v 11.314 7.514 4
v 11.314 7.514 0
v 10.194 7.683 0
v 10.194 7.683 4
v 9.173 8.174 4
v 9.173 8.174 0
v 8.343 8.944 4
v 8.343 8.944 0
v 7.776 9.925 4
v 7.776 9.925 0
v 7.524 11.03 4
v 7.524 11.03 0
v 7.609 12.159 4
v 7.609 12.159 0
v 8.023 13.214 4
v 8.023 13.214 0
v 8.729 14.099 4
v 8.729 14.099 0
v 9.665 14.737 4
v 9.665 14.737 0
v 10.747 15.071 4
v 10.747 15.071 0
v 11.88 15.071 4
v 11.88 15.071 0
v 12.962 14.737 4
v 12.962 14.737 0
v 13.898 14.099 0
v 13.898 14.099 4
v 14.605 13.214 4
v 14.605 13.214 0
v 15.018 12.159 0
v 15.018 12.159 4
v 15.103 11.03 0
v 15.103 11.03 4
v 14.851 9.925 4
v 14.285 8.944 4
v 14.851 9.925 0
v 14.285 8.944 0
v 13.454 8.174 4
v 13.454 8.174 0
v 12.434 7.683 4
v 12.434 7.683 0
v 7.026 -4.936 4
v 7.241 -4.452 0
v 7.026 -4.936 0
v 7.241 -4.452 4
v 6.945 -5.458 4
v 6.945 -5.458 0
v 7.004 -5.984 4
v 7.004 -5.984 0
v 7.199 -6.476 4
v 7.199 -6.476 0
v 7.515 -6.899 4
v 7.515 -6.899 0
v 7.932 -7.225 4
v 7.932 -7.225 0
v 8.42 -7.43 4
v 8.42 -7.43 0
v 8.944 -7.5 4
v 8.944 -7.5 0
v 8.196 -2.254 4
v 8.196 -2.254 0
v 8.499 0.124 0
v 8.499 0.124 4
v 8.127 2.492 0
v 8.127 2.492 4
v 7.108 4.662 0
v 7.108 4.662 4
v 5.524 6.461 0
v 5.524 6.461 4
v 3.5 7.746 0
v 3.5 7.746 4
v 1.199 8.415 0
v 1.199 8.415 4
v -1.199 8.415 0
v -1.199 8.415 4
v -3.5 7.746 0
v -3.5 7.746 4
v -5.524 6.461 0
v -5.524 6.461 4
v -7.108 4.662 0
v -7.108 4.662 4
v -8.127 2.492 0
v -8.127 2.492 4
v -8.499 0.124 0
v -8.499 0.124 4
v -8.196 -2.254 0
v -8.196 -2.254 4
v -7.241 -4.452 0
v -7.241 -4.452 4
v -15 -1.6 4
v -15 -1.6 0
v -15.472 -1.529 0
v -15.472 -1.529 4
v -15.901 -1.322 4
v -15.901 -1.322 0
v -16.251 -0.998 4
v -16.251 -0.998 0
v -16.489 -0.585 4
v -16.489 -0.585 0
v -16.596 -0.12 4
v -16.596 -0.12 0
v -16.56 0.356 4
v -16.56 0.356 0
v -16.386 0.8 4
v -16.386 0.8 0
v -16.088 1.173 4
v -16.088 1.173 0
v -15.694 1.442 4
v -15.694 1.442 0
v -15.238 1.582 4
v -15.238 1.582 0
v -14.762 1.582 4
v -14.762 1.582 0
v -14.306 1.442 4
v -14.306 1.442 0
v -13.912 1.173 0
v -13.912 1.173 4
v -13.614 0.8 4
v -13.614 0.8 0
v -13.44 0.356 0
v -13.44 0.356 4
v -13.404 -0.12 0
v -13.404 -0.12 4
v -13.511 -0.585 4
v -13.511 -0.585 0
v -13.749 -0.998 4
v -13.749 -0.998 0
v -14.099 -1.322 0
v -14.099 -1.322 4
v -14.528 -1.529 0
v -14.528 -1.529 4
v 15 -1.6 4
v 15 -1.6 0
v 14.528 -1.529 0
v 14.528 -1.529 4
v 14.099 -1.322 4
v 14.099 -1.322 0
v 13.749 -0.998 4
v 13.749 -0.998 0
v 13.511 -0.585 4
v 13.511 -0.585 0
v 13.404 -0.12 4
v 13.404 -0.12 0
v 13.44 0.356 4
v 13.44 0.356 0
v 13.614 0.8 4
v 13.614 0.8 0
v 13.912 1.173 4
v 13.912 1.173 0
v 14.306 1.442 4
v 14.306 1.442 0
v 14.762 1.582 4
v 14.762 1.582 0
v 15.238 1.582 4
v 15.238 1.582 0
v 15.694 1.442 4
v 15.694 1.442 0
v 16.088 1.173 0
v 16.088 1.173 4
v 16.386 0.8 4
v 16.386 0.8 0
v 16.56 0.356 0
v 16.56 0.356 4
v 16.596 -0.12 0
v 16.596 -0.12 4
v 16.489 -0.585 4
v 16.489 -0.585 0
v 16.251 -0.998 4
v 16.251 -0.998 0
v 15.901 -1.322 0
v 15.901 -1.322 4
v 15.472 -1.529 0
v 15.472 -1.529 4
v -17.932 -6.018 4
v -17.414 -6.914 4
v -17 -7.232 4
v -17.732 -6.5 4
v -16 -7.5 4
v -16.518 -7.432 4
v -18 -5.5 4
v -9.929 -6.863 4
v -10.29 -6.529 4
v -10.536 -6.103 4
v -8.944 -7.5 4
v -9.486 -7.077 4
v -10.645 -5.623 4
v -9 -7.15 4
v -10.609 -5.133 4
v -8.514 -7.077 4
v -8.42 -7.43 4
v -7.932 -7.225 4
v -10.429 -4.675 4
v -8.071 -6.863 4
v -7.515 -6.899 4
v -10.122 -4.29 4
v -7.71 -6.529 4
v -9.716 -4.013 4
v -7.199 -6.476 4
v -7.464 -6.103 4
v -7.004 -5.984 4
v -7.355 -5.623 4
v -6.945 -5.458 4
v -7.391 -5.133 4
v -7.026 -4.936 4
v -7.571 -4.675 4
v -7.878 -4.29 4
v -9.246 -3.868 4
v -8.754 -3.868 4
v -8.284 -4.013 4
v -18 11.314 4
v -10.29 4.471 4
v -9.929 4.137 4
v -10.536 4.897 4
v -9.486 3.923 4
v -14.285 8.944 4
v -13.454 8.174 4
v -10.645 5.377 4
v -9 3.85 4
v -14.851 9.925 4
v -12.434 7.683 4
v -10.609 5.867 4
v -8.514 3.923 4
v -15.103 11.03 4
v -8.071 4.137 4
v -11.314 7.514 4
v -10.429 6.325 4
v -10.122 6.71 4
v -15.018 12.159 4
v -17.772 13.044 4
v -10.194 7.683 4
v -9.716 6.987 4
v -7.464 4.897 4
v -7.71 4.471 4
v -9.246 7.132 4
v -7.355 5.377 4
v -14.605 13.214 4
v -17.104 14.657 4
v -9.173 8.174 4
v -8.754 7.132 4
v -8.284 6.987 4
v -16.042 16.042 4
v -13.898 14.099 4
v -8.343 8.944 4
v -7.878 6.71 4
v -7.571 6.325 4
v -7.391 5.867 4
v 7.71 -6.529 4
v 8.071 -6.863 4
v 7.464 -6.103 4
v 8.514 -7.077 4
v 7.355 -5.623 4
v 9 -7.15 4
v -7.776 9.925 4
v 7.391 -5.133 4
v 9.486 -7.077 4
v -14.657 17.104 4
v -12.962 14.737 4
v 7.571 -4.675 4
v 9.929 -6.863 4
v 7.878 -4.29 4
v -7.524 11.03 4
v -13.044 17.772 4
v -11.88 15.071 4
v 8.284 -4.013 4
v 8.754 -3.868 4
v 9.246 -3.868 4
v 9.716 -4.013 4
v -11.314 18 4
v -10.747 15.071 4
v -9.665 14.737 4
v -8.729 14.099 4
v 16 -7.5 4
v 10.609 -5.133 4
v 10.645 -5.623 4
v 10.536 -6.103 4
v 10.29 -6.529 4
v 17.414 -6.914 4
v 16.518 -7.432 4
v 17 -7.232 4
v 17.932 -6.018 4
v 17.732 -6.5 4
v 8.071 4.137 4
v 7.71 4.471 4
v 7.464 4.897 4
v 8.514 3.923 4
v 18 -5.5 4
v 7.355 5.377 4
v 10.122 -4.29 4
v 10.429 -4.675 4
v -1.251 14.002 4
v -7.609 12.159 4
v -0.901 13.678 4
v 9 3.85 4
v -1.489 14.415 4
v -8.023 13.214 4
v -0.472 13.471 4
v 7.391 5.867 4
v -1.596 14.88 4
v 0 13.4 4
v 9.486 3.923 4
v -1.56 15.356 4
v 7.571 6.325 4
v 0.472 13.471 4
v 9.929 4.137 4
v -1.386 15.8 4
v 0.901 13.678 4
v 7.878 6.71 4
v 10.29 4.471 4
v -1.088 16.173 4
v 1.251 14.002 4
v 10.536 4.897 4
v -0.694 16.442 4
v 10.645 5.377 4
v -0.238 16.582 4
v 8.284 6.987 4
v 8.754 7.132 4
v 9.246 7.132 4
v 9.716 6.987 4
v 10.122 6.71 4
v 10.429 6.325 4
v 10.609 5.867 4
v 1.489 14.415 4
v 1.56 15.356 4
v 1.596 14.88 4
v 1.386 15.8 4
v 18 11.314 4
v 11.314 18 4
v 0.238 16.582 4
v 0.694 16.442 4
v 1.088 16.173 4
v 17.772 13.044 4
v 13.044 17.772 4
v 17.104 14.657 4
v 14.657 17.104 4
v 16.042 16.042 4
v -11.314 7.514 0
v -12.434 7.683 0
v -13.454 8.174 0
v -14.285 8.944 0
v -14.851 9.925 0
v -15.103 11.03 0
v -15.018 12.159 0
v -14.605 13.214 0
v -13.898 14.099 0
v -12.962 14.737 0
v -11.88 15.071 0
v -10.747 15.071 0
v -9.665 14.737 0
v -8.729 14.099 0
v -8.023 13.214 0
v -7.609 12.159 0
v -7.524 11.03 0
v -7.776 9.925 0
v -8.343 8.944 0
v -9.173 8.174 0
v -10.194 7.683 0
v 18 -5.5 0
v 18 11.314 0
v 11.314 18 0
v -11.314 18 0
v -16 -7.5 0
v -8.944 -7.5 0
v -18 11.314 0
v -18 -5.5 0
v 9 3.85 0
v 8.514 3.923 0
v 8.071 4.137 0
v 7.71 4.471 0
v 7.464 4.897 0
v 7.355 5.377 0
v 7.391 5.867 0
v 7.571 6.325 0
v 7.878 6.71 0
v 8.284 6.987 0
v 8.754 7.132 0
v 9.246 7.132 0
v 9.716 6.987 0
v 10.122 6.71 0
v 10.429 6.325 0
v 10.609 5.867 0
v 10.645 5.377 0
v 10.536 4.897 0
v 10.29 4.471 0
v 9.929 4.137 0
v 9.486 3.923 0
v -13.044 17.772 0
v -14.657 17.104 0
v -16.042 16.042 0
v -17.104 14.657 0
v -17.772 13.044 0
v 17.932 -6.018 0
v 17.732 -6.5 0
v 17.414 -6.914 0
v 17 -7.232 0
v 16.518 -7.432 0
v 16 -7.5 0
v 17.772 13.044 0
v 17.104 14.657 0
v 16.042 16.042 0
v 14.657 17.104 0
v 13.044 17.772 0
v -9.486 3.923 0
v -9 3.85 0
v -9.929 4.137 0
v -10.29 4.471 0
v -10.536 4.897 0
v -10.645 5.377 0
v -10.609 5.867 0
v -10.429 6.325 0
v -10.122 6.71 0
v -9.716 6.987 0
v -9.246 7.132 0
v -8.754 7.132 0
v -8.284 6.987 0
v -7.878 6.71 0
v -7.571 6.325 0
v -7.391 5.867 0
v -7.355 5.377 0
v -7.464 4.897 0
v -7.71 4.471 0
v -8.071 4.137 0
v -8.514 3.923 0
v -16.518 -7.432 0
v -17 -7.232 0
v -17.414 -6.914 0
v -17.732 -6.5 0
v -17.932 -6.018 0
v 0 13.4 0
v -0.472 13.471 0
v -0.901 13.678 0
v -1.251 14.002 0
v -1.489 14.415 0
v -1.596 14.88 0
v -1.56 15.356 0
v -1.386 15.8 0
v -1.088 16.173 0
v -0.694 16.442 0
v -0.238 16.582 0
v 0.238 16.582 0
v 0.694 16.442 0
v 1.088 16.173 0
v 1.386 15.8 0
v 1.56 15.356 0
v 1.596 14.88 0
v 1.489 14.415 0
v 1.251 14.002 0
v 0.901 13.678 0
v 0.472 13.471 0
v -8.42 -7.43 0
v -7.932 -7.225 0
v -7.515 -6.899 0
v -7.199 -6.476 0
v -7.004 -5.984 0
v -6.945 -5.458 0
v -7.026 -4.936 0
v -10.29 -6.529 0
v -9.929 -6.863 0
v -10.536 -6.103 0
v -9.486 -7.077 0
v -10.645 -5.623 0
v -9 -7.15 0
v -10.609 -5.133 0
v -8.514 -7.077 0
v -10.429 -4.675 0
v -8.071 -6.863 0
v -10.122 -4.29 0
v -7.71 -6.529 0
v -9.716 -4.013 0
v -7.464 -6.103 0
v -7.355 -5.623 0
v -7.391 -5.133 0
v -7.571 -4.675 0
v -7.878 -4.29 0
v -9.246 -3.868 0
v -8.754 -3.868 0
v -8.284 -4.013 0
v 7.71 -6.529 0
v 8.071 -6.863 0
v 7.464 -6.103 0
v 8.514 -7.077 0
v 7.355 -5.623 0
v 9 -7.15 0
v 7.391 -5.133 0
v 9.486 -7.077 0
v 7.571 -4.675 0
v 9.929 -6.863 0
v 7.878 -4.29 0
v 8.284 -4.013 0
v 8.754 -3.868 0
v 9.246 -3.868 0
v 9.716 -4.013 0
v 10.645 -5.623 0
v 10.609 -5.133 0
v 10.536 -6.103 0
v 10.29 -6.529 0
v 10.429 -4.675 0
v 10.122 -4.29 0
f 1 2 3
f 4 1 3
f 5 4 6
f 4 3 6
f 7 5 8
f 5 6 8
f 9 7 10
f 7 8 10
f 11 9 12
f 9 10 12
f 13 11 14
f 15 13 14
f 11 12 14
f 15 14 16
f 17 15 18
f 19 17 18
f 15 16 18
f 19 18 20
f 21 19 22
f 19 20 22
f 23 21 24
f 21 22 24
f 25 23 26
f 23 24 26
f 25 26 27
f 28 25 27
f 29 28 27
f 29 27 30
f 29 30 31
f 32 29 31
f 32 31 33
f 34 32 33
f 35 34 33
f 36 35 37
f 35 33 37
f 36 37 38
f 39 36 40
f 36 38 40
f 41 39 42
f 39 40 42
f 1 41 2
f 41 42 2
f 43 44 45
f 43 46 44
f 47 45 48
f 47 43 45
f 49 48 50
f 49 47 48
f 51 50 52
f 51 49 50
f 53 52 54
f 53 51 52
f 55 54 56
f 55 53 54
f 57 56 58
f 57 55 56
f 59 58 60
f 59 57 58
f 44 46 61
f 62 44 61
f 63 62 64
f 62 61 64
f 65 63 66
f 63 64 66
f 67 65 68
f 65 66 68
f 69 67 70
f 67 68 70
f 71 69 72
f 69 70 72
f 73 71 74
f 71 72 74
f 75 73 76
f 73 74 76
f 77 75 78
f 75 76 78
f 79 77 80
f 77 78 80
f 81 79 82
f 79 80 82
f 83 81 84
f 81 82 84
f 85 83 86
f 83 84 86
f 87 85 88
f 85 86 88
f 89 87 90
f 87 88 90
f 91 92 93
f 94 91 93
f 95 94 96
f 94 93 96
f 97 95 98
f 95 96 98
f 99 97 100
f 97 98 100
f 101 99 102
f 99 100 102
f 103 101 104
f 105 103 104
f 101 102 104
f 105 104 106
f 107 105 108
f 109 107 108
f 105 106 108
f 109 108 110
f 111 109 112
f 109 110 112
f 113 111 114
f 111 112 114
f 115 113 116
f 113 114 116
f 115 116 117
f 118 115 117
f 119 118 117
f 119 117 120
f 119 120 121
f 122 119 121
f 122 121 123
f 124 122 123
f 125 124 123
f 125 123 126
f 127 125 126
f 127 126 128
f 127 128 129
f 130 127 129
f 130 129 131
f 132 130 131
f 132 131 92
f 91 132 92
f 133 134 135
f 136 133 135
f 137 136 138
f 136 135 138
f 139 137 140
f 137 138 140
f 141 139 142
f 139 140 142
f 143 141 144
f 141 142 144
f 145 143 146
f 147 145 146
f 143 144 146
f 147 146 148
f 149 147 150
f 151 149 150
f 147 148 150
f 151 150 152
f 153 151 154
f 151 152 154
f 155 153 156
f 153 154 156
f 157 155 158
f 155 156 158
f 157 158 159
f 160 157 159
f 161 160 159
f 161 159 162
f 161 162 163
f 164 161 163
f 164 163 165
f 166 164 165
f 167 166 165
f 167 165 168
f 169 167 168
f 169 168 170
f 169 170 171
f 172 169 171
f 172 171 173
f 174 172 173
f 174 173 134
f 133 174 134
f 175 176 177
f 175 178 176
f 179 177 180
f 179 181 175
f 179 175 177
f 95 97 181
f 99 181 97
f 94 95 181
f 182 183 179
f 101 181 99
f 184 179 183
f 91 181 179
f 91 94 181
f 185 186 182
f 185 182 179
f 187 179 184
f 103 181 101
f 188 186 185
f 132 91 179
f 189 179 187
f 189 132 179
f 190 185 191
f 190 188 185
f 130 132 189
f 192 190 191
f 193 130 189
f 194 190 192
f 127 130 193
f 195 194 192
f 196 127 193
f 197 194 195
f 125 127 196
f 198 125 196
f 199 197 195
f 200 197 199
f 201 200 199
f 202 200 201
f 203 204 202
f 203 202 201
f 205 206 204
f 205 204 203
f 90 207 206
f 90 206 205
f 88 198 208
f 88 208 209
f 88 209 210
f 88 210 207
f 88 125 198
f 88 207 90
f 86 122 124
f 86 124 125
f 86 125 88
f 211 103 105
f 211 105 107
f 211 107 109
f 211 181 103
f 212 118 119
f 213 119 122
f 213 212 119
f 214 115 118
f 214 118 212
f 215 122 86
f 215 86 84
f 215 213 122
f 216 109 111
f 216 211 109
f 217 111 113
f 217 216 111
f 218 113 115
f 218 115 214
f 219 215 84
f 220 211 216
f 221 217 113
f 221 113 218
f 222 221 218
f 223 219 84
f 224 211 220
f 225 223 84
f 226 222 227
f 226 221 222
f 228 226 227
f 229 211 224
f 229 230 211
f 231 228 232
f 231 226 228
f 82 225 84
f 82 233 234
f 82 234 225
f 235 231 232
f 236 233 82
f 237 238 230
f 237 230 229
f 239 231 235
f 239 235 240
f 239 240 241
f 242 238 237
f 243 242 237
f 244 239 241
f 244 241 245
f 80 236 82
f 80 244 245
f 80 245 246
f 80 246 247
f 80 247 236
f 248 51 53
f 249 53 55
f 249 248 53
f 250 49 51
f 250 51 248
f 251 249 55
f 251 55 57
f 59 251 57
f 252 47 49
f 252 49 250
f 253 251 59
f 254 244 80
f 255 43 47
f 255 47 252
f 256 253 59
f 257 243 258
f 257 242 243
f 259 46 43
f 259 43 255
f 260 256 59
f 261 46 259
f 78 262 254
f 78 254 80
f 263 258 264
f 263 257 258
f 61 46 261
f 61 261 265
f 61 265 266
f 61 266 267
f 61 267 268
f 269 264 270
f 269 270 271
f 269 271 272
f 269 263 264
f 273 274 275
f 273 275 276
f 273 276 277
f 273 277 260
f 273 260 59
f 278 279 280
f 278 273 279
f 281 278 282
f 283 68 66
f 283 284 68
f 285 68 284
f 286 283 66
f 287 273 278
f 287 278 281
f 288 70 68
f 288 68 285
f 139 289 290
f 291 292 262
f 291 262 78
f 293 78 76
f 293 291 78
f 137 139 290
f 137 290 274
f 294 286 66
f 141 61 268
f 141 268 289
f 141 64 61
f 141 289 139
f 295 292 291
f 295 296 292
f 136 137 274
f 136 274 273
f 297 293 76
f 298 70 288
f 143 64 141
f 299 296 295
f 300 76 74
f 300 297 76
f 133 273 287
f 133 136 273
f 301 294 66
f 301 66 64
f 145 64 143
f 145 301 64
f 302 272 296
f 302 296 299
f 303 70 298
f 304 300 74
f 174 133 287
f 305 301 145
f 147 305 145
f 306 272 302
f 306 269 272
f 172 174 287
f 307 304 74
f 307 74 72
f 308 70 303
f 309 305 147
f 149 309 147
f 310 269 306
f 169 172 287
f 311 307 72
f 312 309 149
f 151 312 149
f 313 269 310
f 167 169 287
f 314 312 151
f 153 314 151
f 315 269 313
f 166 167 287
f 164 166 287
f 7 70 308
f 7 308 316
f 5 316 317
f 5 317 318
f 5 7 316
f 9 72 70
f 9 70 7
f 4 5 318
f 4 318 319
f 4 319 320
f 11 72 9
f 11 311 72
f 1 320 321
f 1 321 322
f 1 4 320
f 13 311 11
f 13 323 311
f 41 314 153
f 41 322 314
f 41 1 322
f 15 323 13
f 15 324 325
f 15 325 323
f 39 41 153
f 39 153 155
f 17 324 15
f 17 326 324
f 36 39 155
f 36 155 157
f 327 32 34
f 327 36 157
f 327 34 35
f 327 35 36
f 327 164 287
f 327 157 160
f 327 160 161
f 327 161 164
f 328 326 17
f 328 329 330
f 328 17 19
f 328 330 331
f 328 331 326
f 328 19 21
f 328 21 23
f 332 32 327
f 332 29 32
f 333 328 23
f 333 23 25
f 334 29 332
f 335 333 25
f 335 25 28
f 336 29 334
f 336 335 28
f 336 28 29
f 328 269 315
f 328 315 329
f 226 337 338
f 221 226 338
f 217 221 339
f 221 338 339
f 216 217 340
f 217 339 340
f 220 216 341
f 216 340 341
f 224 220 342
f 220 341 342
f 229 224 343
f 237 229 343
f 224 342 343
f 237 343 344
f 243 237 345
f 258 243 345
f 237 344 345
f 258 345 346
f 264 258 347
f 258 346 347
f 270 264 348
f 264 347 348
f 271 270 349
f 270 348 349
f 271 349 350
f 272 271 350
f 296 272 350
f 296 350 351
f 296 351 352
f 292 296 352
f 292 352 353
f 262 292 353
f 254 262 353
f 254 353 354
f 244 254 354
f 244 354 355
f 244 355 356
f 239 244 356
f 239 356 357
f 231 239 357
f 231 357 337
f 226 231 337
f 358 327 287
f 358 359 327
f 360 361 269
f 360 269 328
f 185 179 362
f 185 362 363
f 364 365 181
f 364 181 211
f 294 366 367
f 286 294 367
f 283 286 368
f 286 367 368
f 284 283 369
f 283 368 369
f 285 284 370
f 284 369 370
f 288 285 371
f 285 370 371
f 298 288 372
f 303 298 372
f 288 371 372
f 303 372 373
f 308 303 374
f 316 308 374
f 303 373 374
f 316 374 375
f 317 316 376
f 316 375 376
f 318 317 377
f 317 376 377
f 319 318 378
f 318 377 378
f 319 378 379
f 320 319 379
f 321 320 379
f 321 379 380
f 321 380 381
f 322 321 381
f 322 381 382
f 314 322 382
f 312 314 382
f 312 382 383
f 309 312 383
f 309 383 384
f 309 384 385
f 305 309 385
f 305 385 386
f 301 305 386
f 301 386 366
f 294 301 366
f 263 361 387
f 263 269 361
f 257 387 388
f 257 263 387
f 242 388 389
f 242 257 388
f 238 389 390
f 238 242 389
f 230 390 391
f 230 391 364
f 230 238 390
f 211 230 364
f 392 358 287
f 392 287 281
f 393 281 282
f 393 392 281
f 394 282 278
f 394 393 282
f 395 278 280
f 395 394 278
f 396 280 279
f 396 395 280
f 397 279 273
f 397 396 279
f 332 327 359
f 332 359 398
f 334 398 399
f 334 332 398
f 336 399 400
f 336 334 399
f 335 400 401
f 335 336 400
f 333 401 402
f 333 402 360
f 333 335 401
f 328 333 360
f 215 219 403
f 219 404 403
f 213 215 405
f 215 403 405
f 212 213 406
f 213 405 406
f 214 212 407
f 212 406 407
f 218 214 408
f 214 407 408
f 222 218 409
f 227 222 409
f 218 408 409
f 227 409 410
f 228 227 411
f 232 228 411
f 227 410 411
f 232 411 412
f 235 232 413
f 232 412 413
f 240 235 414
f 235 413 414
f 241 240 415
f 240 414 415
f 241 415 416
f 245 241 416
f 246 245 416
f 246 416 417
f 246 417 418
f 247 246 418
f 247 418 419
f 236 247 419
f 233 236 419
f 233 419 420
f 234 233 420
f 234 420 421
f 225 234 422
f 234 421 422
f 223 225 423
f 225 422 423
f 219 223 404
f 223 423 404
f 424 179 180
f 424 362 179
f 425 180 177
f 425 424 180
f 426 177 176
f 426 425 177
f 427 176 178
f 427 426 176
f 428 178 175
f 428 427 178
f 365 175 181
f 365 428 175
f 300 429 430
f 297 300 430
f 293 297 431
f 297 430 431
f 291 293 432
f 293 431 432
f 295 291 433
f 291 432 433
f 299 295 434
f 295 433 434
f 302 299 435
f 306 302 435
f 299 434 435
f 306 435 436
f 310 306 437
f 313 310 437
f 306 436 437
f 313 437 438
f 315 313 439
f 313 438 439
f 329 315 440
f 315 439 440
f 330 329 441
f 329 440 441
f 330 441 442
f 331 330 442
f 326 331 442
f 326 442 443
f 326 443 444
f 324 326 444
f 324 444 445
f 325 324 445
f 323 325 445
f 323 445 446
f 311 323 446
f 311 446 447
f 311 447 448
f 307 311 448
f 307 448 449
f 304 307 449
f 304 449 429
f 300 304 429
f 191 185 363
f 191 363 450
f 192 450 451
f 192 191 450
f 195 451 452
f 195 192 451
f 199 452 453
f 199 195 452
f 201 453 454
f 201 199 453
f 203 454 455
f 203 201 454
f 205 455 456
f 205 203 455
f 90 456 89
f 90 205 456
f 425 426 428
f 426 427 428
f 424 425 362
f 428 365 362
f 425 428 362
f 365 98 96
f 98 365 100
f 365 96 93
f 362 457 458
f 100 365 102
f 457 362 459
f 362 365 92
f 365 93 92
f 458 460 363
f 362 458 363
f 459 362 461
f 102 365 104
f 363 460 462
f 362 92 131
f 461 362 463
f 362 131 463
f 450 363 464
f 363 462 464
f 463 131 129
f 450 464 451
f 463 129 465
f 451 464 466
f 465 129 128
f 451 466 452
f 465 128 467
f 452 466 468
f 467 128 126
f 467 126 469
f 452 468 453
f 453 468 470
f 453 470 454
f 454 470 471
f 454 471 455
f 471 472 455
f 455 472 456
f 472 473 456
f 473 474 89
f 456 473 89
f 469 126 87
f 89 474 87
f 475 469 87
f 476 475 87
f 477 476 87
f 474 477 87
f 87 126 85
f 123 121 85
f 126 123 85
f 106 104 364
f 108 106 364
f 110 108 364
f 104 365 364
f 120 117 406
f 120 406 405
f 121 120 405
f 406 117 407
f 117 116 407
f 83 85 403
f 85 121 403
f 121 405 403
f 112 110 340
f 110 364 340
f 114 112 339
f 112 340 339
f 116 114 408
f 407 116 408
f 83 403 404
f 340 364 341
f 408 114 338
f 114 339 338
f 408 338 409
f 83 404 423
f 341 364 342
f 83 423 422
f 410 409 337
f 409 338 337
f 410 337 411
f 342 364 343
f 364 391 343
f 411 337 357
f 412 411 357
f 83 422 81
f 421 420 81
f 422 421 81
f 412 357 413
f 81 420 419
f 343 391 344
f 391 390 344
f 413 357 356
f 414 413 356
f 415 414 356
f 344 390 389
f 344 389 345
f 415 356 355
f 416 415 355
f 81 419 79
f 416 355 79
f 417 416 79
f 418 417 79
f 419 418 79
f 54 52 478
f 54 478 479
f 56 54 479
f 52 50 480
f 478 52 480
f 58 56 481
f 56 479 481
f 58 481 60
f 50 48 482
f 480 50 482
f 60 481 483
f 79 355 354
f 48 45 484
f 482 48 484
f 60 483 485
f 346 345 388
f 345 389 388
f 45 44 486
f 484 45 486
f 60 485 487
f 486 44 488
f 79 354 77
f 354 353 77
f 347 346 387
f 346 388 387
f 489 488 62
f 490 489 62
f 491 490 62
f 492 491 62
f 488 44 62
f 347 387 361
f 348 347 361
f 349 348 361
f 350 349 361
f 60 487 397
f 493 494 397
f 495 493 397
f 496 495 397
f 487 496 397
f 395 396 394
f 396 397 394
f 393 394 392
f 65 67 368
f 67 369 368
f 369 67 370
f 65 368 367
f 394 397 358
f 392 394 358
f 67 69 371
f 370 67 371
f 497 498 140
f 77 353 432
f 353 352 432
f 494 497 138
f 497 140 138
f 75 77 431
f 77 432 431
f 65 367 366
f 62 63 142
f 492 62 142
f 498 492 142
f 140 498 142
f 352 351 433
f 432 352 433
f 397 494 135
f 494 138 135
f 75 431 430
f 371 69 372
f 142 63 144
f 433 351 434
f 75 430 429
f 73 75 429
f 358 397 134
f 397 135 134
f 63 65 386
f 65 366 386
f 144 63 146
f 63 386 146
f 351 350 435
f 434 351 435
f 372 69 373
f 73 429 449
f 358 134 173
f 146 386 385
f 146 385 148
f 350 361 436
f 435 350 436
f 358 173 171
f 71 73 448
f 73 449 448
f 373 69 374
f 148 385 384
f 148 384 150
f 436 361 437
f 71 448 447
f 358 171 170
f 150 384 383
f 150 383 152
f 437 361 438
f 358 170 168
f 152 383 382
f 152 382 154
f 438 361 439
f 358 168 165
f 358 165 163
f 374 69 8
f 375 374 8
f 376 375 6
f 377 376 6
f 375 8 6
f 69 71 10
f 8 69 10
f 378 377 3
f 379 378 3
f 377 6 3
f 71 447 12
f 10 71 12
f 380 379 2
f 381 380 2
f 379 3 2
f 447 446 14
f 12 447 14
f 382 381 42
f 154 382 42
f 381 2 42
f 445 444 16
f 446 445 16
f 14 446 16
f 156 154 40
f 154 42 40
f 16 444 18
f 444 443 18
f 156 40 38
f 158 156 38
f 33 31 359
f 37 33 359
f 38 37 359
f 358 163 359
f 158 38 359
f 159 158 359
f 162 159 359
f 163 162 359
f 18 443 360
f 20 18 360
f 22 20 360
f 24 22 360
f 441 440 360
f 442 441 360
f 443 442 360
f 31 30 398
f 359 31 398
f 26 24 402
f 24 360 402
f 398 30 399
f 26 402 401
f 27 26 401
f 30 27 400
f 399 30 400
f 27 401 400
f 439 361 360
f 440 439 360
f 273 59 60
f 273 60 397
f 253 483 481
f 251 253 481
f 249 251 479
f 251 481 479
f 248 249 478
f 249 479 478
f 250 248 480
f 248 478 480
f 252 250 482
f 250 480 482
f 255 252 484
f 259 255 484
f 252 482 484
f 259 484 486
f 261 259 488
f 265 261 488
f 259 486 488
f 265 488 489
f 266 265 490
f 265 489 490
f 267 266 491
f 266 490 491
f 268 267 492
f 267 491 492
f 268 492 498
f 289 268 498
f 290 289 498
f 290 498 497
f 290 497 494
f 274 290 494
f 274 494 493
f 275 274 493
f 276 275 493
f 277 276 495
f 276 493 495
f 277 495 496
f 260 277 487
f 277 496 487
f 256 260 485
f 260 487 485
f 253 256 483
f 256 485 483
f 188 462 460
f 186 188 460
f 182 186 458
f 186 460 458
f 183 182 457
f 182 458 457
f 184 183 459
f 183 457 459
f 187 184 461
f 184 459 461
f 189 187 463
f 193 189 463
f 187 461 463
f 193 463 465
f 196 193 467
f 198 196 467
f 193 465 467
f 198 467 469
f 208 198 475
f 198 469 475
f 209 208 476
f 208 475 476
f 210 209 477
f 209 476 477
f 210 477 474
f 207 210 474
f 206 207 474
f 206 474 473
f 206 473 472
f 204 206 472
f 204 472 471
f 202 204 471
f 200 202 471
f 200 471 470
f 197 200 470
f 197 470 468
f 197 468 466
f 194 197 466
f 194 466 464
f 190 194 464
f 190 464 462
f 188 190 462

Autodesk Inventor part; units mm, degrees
ref_plane "YZ Plane" through (0, 0, 0) normal (1, 0, 0) x (0, 1, 0)
ref_plane "XZ Plane" through (0, 0, 0) normal (0, 1, 0) x (-1, 0, 0)
ref_plane "XY Plane" through (0, 0, 0) normal (0, 0, 1) x (1, 0, 0)
sketch "スケッチ1" plane through (0, 0, 0) normal (0, 0, 1) x (1, 0, 0)
  line L0 (18, -18) -> (-18, -18)
  line L1 (-18, -18) -> (-18, 18)
  line L2 (-18, 18) -> (18, 18)
  line L3 (18, 18) -> (18, -18)
  line L4 (18, -18) -> (-18, 18) construction
  line L5 (-18, -18) -> (18, 18) construction
  point P0 (0, 0)
  point P1 (0, 0)
  dimension "d34" = 36
  dimension "d35" = 36
extrude "押し出し1" add sketch "スケッチ1" along normal blind 4
sketch "スケッチ3" plane through (0, 0, 4) normal (0, 0, 1) x (1, 0, 0)
  line L0 (-9, -5.5) -> (9, -5.5)
  line L1 (9, -5.5) -> (9, 5.5)
  line L2 (9, 5.5) -> (-9, 5.5)
  line L3 (-9, 5.5) -> (-9, -5.5)
  line L4 (-9, -5.5) -> (9, 5.5) construction
  line L5 (9, -5.5) -> (-9, 5.5) construction
  point P0 (0, 0)
  dimension "d18" = 18
  dimension "d19" = 11
hole "穴2" at (-9, 5.5, 4) at (-9, -5.5, 4) at (9, -5.5, 4) at (9, 5.5, 4) direction (0, 0, -1) diameter 3.3 end through all
sketch "スケッチ4" plane through (0, 0, 4) normal (0, 0, 1) x (1, 0, 0)
  circle A0 centre (0, 0) radius 8.5
  dimension "d27" = 17
extrude "押し出し2" cut sketch "スケッチ4" against normal through all
sketch "スケッチ5" plane through (0, 0, 4) normal (0, 0, 1) x (1, 0, 0)
  circle A0 centre (0, 0) radius 15
  point P0 (0, 15)
  point P1 (-15, 0)
  point P2 (0, -15)
  point P3 (15, 0)
  dimension "d36" = 30
  dimension "d39" = 360
hole "穴3" at (15, 0, 4) at (-15, 0, 4) at (0, 15, 4) direction (0, 0, -1) diameter 3.2 end through all clearance for "Flat Head Machine Screw" size "M3" standard "Ansi Metric M Profile"
sketch "スケッチ6" plane through (0, 0, 4) normal (0, 0, 1) x (1, 0, 0)
  circle A0 centre (0, 0) radius 16
  point P0 (-11.3137, 11.3137)
  point P1 (-11.3137, -11.3137)
  point P2 (11.3137, -11.3137)
  point P3 (11.3137, 11.3137)
  dimension "d48" = 32
  dimension "d51" = 360
hole "穴4" at (-11.3137, 11.3137, 4) at (-11.3137, -11.3137, 4) at (11.3137, -11.3137, 4) at (11.3137, 11.3137, 4) direction (0, 0, -1) diameter 4.3 end through all counterbore diameter 7.6 counterbore depth 10 clearance for "Socket Head Cap Screw" size "M4" standard "Ansi Metric M Profile"
sketch "スケッチ9" plane through (0, 0, 4) normal (0, 0, 1) x (1, 0, 0)
  line L0 (-11, -7.5) -> (11, -7.5)
  line L1 (11, -7.5) -> (11, 7.5)
  line L2 (11, 7.5) -> (-11, 7.5)
  line L3 (-11, 7.5) -> (-11, -7.5)
  line L4 (-11, -7.5) -> (11, 7.5) construction
  line L5 (11, -7.5) -> (-11, 7.5) construction
  line L6 (-18, 18) -> (-18, -18) projected
  line L7 (-18, -7.5) -> (18, -7.5)
  line L8 (18, -7.5) -> (18, -18)
  line L9 (18, -18) -> (-18, -18)
  line L10 (-18, -18) -> (-18, -7.5)
  line L11 (18, -18) -> (18, 18) projected
  point P0 (0, 0)
  point P1 (18, -11.3137)
  point P2 (18, 11.3137)
  point P3 (-18, -11.3137)
  dimension "d71" = 22
  dimension "d72" = 15
extrude "押し出し5" cut sketch "スケッチ9" against normal through all contours L0 L7 L8 L9 L6
fillet "フィレット2" radius 2 4 edges at (4, -7.5, 2) (-4, -7.5, 2) (-18, -7.5, 2) (18, -7.5, 2)
sketch "スケッチ11" plane through (0, 0, 0) normal (0, 0, -1) x (-1, 0, 0)
  point P0 (0, 0)
fillet "フィレット4" radius 6.6865 2 edges at (-18, 18, 2) (18, 18, 2)
properties part number "unit-base5" material "ABS プラスチック"
